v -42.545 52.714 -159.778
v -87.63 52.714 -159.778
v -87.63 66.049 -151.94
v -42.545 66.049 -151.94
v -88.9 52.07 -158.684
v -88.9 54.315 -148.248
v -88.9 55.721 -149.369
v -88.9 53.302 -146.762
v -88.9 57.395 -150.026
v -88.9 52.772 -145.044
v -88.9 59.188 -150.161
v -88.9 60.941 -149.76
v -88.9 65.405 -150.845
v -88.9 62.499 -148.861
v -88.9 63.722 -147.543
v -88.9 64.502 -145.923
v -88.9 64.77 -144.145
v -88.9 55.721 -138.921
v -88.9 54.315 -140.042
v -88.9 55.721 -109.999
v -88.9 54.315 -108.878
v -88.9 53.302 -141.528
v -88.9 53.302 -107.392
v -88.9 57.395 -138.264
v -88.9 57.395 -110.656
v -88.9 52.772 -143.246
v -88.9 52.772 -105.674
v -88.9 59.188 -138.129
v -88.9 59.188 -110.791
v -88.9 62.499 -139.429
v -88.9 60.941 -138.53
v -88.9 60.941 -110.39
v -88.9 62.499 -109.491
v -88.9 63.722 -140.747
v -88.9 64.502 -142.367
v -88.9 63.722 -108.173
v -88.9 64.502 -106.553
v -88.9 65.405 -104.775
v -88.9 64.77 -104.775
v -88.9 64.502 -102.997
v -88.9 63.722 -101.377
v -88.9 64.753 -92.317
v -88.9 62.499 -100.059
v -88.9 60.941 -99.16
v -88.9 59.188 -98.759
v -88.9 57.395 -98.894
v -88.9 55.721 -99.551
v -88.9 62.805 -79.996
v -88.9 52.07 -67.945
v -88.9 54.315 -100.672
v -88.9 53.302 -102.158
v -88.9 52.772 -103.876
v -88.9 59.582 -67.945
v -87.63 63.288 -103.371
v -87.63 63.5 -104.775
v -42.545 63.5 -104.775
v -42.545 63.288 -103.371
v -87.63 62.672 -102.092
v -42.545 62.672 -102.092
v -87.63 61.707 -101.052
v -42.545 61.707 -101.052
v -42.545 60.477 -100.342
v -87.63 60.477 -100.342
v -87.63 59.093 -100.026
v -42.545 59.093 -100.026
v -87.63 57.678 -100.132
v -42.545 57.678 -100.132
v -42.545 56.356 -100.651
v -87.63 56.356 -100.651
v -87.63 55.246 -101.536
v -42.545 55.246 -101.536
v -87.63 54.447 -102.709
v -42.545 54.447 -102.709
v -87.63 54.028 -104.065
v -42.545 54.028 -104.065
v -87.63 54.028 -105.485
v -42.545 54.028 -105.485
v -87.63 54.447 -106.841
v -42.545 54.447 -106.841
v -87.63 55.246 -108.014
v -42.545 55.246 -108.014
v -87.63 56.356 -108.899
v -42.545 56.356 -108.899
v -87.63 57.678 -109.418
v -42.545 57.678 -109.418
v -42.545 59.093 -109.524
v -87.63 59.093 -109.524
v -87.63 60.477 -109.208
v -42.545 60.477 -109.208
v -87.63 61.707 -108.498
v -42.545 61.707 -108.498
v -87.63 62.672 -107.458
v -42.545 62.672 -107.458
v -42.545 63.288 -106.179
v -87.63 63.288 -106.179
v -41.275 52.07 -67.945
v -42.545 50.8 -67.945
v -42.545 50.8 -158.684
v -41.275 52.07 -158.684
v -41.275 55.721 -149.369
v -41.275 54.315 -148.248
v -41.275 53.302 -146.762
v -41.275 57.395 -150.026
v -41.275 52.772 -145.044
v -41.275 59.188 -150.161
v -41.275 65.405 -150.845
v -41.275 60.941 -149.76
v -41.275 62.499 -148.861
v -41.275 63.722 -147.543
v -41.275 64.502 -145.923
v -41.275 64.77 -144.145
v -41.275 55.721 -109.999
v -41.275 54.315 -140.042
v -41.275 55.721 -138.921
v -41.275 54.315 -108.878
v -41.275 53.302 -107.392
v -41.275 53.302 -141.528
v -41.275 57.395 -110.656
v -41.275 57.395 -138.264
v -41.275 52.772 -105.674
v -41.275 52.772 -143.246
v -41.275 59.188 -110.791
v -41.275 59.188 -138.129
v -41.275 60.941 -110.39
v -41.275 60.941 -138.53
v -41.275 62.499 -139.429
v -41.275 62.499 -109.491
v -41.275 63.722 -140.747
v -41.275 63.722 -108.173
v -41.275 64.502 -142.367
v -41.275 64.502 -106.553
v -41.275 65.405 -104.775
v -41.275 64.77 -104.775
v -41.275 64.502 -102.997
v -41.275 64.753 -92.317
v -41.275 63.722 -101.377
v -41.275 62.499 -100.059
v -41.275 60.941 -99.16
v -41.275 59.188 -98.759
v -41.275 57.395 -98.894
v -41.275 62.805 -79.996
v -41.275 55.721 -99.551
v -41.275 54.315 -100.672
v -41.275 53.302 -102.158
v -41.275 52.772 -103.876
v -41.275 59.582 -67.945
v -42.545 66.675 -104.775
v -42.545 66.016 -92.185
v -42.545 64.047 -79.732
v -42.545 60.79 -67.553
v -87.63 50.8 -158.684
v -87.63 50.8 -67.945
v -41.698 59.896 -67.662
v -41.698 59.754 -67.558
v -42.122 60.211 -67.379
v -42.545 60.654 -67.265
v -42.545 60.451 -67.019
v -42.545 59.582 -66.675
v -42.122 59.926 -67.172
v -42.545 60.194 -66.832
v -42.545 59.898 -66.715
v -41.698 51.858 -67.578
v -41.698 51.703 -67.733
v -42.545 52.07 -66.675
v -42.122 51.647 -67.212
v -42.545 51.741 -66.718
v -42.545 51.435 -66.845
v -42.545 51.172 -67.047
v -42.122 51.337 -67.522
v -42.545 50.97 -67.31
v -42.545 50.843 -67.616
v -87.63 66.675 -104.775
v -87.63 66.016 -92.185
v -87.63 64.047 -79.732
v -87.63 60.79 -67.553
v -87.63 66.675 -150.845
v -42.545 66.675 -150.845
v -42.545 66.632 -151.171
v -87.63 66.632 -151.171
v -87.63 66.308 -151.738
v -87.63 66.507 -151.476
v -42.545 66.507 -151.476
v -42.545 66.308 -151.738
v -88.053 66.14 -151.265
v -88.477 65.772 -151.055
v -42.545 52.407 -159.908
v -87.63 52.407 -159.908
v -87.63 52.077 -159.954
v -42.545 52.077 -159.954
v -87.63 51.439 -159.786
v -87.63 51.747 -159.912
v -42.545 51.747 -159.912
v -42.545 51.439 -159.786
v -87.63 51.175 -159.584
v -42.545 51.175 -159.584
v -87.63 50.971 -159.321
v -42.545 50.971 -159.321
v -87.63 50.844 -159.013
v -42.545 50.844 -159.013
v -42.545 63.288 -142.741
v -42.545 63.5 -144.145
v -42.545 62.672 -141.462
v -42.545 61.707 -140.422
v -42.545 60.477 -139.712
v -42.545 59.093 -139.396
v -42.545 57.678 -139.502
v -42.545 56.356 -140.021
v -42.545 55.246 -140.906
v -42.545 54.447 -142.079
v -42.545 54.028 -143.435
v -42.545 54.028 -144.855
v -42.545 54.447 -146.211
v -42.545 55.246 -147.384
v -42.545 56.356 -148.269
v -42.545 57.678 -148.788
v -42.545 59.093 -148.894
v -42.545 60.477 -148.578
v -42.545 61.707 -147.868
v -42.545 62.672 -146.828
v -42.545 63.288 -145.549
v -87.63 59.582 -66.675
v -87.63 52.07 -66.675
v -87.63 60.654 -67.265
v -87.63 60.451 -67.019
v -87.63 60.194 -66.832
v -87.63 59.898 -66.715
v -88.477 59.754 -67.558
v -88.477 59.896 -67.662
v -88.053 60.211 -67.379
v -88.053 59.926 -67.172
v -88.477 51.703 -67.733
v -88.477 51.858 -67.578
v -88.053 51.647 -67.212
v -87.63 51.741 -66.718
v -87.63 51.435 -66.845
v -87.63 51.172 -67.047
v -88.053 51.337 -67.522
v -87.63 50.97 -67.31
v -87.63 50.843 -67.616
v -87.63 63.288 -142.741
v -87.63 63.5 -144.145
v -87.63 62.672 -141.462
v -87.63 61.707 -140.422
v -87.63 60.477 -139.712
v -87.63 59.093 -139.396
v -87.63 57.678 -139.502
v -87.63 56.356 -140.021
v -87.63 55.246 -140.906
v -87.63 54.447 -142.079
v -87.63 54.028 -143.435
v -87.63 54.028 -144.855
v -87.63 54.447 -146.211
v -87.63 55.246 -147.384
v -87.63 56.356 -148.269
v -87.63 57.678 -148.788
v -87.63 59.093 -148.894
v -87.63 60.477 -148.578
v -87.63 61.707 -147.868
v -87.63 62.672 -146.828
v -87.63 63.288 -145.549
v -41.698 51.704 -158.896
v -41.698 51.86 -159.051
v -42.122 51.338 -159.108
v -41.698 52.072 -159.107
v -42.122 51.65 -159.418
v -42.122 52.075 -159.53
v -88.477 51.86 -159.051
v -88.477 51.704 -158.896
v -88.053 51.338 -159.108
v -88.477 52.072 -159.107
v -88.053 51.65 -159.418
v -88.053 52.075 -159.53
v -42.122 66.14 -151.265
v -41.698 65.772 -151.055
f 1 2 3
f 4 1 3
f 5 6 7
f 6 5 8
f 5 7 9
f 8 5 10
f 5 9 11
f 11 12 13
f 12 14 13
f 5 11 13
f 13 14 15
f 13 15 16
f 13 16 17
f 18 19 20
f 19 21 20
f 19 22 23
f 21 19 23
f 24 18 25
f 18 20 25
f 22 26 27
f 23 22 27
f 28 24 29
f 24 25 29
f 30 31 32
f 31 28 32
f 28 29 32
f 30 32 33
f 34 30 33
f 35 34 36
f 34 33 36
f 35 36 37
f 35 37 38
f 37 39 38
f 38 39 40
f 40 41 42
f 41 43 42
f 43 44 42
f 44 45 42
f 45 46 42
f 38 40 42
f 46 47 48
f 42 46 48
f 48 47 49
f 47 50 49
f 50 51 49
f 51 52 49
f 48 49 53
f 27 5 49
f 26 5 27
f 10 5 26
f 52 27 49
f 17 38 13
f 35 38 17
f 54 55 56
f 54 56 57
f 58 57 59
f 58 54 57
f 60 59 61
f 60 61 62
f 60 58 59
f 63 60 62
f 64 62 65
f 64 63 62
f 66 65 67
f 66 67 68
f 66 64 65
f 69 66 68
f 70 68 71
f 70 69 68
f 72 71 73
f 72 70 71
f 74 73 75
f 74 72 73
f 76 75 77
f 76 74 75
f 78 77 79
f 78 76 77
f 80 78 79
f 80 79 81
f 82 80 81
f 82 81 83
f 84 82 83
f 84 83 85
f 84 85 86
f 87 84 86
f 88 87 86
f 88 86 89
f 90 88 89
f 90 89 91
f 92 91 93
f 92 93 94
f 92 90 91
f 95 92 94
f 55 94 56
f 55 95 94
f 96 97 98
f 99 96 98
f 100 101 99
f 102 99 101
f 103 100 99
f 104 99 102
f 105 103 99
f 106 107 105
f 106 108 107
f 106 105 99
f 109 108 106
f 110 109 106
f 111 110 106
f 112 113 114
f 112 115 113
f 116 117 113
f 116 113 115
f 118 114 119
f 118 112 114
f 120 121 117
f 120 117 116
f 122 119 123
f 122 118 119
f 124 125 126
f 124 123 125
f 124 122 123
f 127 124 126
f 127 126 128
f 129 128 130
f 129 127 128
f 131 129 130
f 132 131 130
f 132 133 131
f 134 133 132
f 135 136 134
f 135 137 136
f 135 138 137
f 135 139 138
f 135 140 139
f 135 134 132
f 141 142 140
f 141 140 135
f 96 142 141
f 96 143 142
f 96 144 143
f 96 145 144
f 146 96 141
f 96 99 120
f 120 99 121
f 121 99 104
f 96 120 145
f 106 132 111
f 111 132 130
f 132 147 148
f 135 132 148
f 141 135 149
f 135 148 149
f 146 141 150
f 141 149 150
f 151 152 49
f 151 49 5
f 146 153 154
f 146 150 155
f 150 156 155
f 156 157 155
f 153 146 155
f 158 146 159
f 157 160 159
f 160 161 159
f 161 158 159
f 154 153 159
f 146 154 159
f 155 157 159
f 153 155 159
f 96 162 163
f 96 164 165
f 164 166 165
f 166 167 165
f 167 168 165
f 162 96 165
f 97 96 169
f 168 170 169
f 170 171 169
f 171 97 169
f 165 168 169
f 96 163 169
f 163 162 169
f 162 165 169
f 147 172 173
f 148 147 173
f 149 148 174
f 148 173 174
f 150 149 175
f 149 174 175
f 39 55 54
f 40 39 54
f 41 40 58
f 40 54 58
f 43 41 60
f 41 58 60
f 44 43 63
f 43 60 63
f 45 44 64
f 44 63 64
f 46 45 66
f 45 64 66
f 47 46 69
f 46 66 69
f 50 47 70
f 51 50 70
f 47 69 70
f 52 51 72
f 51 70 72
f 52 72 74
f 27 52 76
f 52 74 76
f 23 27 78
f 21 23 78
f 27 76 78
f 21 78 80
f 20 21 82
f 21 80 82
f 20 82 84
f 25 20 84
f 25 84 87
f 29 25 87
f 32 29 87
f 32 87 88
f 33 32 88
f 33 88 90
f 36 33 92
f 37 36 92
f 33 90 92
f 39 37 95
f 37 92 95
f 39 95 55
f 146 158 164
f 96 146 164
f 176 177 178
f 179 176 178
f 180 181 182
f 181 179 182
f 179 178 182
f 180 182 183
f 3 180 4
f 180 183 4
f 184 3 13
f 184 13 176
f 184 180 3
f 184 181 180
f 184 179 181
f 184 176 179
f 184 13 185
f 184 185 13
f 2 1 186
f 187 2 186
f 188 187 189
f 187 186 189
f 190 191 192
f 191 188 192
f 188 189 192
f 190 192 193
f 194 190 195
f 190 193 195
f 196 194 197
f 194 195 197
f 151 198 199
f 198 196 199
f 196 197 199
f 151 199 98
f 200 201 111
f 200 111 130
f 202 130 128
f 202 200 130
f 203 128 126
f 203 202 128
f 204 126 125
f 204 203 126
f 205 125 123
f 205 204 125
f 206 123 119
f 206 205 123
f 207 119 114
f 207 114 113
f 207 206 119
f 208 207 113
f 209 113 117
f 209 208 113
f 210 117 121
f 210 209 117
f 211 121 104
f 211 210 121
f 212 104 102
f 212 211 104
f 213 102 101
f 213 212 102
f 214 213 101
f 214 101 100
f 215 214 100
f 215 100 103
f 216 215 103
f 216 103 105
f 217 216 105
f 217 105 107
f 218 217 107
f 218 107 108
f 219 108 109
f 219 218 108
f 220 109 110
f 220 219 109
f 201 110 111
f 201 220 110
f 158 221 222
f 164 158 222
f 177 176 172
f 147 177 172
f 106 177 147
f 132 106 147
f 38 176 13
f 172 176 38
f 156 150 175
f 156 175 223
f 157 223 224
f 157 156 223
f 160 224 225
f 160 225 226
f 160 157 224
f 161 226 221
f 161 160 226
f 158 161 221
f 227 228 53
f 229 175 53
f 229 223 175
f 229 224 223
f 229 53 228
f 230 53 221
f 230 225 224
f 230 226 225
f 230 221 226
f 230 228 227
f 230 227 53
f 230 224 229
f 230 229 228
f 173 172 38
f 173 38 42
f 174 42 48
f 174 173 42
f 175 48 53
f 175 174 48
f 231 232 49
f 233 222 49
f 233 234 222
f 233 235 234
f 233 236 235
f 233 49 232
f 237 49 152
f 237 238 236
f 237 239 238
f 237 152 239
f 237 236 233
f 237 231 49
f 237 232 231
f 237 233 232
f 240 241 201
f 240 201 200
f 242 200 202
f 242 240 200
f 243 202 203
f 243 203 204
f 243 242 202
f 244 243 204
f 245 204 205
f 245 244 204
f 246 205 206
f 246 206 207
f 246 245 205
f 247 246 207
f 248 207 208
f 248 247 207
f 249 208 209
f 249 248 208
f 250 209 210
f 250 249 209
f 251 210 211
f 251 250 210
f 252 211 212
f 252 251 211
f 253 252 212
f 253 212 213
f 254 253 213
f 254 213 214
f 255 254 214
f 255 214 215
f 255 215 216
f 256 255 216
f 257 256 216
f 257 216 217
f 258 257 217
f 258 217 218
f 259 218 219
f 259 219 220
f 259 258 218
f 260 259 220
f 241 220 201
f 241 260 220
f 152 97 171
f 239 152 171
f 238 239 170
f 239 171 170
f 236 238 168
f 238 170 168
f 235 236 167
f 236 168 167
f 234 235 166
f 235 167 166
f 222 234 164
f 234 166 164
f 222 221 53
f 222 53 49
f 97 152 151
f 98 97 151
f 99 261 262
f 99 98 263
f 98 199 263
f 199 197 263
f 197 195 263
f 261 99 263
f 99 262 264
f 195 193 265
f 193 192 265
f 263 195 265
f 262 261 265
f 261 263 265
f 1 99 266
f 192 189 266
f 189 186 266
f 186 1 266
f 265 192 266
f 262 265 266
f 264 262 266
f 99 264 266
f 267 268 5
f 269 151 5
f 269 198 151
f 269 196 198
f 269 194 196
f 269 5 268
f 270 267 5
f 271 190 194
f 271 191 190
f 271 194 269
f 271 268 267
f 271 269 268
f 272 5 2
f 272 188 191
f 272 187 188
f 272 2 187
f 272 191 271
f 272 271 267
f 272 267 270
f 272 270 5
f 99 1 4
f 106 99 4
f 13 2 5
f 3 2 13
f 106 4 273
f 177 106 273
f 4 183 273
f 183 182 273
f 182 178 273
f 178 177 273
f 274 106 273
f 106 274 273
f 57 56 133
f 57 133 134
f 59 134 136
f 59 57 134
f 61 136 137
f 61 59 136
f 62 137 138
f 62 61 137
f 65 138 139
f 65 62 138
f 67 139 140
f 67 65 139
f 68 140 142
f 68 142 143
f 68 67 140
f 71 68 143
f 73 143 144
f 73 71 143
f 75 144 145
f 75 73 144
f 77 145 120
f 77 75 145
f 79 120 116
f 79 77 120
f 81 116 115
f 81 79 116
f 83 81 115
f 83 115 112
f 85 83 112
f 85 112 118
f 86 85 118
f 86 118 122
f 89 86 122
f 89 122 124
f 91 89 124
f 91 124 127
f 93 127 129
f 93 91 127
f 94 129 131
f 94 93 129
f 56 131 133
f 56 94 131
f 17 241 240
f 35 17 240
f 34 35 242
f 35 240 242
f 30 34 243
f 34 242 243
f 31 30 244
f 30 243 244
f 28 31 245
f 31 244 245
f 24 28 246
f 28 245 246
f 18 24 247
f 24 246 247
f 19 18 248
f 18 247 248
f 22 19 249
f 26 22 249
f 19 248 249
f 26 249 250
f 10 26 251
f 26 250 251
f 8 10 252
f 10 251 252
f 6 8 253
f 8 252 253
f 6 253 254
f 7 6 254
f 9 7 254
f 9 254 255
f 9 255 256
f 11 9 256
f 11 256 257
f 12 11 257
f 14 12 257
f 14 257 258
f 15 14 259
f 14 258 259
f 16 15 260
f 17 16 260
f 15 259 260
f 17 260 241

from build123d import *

# Parameters (mm, degrees)
STOCK_HAMMERSAW_START                 = -88.9
STOCK_HAMMERSAW_MULTIBODY_1_OUTLINE_R = 4.7625
STOCK_HAMMERSAW_MULTIBODY_1_DEPTH     = 47.625
FILLET1_R                             = 1.27
CHAMFER1_SIZE                         = 1.27


# Read off the part's stored shape, not the designer's step: Stock-HammerSaw Multibody-1
with BuildPart() as part:
    # Stock-HammerSaw Multibody-1 outline → Stock-HammerSaw Multibody-1 (new body)
    with BuildSketch(Plane.YZ.offset(STOCK_HAMMERSAW_START)):
        with BuildLine():
            Line((66.675, -151.571456433), (66.675, -104.775))
            ThreePointArc((66.675, -104.775), (65.121562553, -85.476521096), (60.501252996, -66.675))
            Line((60.501252996, -66.675), (50.8, -66.675))
            Line((50.8, -66.675), (50.8, -160.903282658))
            Line((50.8, -160.903282658), (66.675, -151.571456433))
        make_face()
        with Locations((58.7375, -144.145)):
            Circle(STOCK_HAMMERSAW_MULTIBODY_1_OUTLINE_R, mode=Mode.SUBTRACT)
        with Locations((58.7375, -104.775)):
            Circle(STOCK_HAMMERSAW_MULTIBODY_1_OUTLINE_R, mode=Mode.SUBTRACT)
    extrude(amount=STOCK_HAMMERSAW_MULTIBODY_1_DEPTH)

    # Fillet1
    fillet1_edges = [part.edges().sort_by_distance(p)[0] for p in [
        (-65.0875, 66.675, -151.571456433),
        (-65.0875, 50.8, -160.903282658),
        (-65.0875, 50.8, -66.675),
        (-65.0875, 60.501252996, -66.675),
    ]]
    fillet(fillet1_edges, radius=FILLET1_R)

    # Chamfer1
    chamfer1_edges = [part.edges().sort_by_distance(p)[0] for p in [
        (-41.275, 53.975, -144.145),
        (-41.275, 53.975, -104.775),
        (-88.9, 65.194617982, -85.932902187),
        (-88.9, 53.975, -144.145),
        (-88.9, 53.975, -104.775),
        (-88.9, 50.8, -113.314283072),
        (-41.275, 50.8, -113.314283072),
        (-41.275, 55.825875065, -66.675),
        (-41.275, 59.381087146, -155.859048701),
        (-41.275, 66.675, -127.809916057),
        (-41.275, 51.171974388, -67.046974388),
        (-41.275, 60.328510865, -66.917747157),
        (-41.275, 66.507328371, -151.475523927),
        (-41.275, 51.439308188, -159.785894515),
        (-88.9, 59.381087146, -155.859048701),
        (-88.9, 66.675, -127.809916057),
        (-88.9, 55.825875065, -66.675),
        (-88.9, 51.171974388, -67.046974388),
        (-88.9, 60.328510865, -66.917747157),
        (-88.9, 66.507328371, -151.475523927),
        (-88.9, 51.439308188, -159.785894515),
        (-41.275, 65.194617982, -85.932902187),
    ]]
    chamfer(chamfer1_edges, length=CHAMFER1_SIZE)


solid = part.part
